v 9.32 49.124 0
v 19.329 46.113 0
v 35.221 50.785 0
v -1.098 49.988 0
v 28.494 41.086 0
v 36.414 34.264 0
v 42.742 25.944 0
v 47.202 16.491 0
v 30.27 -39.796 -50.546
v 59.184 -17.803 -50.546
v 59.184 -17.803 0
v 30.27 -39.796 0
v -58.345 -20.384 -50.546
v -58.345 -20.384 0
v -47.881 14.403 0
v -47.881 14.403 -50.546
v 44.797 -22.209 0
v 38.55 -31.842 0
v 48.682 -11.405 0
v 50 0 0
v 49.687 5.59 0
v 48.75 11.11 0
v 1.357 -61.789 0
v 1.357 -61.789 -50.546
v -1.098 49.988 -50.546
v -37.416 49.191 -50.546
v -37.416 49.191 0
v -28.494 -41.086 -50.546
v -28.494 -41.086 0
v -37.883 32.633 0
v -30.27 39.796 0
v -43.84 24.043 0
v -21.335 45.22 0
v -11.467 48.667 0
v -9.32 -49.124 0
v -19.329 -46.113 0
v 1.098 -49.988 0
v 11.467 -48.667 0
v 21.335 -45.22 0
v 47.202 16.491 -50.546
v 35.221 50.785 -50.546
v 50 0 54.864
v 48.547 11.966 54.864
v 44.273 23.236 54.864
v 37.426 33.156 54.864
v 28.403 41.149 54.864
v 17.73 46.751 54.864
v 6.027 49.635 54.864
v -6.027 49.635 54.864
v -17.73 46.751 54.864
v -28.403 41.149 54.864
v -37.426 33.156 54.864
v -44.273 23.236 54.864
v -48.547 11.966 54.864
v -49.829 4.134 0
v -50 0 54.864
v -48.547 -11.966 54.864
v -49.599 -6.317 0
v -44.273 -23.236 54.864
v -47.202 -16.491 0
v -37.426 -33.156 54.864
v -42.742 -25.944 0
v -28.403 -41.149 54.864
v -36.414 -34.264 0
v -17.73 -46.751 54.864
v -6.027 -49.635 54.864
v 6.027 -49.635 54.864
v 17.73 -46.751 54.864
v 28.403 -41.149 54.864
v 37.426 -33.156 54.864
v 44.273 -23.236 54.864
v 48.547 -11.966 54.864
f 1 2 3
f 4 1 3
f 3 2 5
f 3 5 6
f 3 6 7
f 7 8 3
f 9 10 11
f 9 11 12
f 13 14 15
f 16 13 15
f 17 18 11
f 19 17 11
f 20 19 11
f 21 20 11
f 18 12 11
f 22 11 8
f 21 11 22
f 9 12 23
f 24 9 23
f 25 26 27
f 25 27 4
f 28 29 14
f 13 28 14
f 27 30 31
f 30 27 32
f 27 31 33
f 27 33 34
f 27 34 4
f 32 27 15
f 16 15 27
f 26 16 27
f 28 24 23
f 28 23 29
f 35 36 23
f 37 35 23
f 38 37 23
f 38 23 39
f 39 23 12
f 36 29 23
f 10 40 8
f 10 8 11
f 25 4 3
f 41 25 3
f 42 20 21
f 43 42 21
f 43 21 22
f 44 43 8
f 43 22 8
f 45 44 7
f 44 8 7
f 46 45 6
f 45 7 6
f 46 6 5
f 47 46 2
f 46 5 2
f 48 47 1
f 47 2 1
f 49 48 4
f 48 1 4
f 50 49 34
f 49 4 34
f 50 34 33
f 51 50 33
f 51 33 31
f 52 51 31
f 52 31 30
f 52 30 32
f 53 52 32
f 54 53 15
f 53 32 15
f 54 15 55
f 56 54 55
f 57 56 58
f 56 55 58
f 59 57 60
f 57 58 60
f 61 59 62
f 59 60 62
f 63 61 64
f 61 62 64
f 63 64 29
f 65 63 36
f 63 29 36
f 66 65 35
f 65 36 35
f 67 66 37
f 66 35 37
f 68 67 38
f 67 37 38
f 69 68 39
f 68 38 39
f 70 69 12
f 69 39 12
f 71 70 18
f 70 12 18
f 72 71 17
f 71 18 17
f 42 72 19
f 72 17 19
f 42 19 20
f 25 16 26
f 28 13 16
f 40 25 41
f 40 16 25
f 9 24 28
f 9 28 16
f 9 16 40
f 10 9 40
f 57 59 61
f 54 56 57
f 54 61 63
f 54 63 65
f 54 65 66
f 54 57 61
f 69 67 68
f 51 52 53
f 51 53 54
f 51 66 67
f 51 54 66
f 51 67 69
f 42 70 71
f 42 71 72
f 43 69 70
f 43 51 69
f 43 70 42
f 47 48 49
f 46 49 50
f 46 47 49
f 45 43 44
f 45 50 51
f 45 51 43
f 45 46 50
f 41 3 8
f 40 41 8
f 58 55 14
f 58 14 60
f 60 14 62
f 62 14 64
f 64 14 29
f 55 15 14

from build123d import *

# Parameters (mm, degrees)
F0_R     = 50
F1_DEPTH = 54.864
F3_DEPTH = 50.546


with BuildPart() as f1:
    # F0 (on Top) → F1 (new body)
    with BuildSketch(Plane.XY):
        Circle(F0_R)
    extrude(amount=F1_DEPTH)

    # F2 (on face) → F3 (join)
    with BuildSketch(Plane(origin=(0, 0, 0), x_dir=(1, 0, 0), z_dir=(0, 0, -1))):
        with BuildLine():
            Line((30.2700951576, 39.7959965216), (1.3566113452, 61.7885079781))
            Line((1.3566113452, 61.7885079781), (-28.494267061, 41.0862111256))
            ThreePointArc((-28.494267061, 41.0862111256), (1.0975221129, 49.9879530008), (30.2700951576, 39.7959965216))
        make_face()
        with BuildLine():
            Line((59.1835791051, 17.8034849624), (30.2700951576, 39.7959965216))
            ThreePointArc((30.2700951576, 39.7959965216), (44.7967898285, 22.209178757), (50, 0))
            ThreePointArc((50, 0), (49.2955920393, -8.3632891551), (47.2022157803, -16.4909316118))
            Line((47.2022157803, -16.4909316118), (59.1835791051, 17.8034849624))
        make_face()
        with BuildLine():
            ThreePointArc((50, 0), (44.7967898285, 22.209178757), (30.2700951576, 39.7959965216))
            ThreePointArc((30.2700951576, 39.7959965216), (1.0975221129, 49.9879530008), (-28.494267061, 41.0862111256))
            ThreePointArc((-28.494267061, 41.0862111256), (-47.2022150962, 16.49093357), (-47.8805218829, -14.4033199027))
            ThreePointArc((-47.8805218829, -14.4033199027), (-30.2700960741, -39.7959958245), (-1.097521687, -49.9879530102))
            ThreePointArc((-1.097521687, -49.9879530102), (28.4942681078, -41.0862103996), (47.2022157803, -16.4909316118))
            ThreePointArc((47.2022157803, -16.4909316118), (49.2955920393, -8.3632891551), (50, 0))
        make_face()
        with BuildLine():
            ThreePointArc((-47.8805218829, -14.4033199027), (-47.2022150962, 16.49093357), (-28.494267061, 41.0862111256))
            Line((-28.494267061, 41.0862111256), (-58.3451471843, 20.3839130822))
            Line((-58.3451471843, 20.3839130822), (-47.8805218829, -14.4033199027))
        make_face()
        with BuildLine():
            ThreePointArc((-1.097521687, -49.9879530102), (-30.2700960741, -39.7959958245), (-47.8805218829, -14.4033199027))
            Line((-47.8805218829, -14.4033199027), (-37.4158953837, -49.1905568696))
            Line((-37.4158953837, -49.1905568696), (-1.097521687, -49.9879530102))
        make_face()
        with BuildLine():
            Line((35.2208521177, -50.7853491531), (47.2022157803, -16.4909316118))
            ThreePointArc((47.2022157803, -16.4909316118), (28.4942681078, -41.0862103996), (-1.097521687, -49.9879530102))
            Line((-1.097521687, -49.9879530102), (35.2208521177, -50.7853491531))
        make_face()
    extrude(amount=F3_DEPTH)


solid = f1.part
